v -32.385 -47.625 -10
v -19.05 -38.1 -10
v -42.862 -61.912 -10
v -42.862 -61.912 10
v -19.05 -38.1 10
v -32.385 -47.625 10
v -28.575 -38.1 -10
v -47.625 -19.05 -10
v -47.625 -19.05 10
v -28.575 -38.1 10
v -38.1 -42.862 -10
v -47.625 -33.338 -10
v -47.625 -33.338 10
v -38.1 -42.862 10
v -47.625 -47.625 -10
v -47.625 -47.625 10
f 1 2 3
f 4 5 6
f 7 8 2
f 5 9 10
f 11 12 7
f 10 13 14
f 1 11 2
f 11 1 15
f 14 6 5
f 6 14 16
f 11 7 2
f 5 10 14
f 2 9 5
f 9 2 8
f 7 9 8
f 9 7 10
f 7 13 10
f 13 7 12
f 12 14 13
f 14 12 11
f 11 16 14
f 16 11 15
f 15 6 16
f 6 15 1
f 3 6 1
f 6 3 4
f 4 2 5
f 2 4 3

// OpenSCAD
polyhedron(
    points=[
    [-19.05, -38.1, -10],
    [-47.625, -19.05, -10],
    [-28.575, -38.1, -10],
    [-47.625, -33.3375, -10],
    [-38.1, -42.8625, -10],
    [-47.625, -47.625, -10],
    [-32.385, -47.625, -10],
    [-42.8625, -61.9125, -10],
    [-19.05, -38.1, 10],
    [-47.625, -19.05, 10],
    [-28.575, -38.1, 10],
    [-47.625, -33.3375, 10],
    [-38.1, -42.8625, 10],
    [-47.625, -47.625, 10],
    [-32.385, -47.625, 10],
    [-42.8625, -61.9125, 10],
    ],
    faces=[
        [7,0,6],
        [14,8,15],
        [0,1,2],
        [10,9,8],
        [2,3,4],
        [12,11,10],
        [6,0,4,5],
        [13,12,8,14],
        [0,2,4],
        [12,10,8],
        [0,8,9,1],
        [1,9,10,2],
        [2,10,11,3],
        [3,11,12,4],
        [4,12,13,5],
        [5,13,14,6],
        [6,14,15,7],
        [7,15,8,0],
    ]
);
